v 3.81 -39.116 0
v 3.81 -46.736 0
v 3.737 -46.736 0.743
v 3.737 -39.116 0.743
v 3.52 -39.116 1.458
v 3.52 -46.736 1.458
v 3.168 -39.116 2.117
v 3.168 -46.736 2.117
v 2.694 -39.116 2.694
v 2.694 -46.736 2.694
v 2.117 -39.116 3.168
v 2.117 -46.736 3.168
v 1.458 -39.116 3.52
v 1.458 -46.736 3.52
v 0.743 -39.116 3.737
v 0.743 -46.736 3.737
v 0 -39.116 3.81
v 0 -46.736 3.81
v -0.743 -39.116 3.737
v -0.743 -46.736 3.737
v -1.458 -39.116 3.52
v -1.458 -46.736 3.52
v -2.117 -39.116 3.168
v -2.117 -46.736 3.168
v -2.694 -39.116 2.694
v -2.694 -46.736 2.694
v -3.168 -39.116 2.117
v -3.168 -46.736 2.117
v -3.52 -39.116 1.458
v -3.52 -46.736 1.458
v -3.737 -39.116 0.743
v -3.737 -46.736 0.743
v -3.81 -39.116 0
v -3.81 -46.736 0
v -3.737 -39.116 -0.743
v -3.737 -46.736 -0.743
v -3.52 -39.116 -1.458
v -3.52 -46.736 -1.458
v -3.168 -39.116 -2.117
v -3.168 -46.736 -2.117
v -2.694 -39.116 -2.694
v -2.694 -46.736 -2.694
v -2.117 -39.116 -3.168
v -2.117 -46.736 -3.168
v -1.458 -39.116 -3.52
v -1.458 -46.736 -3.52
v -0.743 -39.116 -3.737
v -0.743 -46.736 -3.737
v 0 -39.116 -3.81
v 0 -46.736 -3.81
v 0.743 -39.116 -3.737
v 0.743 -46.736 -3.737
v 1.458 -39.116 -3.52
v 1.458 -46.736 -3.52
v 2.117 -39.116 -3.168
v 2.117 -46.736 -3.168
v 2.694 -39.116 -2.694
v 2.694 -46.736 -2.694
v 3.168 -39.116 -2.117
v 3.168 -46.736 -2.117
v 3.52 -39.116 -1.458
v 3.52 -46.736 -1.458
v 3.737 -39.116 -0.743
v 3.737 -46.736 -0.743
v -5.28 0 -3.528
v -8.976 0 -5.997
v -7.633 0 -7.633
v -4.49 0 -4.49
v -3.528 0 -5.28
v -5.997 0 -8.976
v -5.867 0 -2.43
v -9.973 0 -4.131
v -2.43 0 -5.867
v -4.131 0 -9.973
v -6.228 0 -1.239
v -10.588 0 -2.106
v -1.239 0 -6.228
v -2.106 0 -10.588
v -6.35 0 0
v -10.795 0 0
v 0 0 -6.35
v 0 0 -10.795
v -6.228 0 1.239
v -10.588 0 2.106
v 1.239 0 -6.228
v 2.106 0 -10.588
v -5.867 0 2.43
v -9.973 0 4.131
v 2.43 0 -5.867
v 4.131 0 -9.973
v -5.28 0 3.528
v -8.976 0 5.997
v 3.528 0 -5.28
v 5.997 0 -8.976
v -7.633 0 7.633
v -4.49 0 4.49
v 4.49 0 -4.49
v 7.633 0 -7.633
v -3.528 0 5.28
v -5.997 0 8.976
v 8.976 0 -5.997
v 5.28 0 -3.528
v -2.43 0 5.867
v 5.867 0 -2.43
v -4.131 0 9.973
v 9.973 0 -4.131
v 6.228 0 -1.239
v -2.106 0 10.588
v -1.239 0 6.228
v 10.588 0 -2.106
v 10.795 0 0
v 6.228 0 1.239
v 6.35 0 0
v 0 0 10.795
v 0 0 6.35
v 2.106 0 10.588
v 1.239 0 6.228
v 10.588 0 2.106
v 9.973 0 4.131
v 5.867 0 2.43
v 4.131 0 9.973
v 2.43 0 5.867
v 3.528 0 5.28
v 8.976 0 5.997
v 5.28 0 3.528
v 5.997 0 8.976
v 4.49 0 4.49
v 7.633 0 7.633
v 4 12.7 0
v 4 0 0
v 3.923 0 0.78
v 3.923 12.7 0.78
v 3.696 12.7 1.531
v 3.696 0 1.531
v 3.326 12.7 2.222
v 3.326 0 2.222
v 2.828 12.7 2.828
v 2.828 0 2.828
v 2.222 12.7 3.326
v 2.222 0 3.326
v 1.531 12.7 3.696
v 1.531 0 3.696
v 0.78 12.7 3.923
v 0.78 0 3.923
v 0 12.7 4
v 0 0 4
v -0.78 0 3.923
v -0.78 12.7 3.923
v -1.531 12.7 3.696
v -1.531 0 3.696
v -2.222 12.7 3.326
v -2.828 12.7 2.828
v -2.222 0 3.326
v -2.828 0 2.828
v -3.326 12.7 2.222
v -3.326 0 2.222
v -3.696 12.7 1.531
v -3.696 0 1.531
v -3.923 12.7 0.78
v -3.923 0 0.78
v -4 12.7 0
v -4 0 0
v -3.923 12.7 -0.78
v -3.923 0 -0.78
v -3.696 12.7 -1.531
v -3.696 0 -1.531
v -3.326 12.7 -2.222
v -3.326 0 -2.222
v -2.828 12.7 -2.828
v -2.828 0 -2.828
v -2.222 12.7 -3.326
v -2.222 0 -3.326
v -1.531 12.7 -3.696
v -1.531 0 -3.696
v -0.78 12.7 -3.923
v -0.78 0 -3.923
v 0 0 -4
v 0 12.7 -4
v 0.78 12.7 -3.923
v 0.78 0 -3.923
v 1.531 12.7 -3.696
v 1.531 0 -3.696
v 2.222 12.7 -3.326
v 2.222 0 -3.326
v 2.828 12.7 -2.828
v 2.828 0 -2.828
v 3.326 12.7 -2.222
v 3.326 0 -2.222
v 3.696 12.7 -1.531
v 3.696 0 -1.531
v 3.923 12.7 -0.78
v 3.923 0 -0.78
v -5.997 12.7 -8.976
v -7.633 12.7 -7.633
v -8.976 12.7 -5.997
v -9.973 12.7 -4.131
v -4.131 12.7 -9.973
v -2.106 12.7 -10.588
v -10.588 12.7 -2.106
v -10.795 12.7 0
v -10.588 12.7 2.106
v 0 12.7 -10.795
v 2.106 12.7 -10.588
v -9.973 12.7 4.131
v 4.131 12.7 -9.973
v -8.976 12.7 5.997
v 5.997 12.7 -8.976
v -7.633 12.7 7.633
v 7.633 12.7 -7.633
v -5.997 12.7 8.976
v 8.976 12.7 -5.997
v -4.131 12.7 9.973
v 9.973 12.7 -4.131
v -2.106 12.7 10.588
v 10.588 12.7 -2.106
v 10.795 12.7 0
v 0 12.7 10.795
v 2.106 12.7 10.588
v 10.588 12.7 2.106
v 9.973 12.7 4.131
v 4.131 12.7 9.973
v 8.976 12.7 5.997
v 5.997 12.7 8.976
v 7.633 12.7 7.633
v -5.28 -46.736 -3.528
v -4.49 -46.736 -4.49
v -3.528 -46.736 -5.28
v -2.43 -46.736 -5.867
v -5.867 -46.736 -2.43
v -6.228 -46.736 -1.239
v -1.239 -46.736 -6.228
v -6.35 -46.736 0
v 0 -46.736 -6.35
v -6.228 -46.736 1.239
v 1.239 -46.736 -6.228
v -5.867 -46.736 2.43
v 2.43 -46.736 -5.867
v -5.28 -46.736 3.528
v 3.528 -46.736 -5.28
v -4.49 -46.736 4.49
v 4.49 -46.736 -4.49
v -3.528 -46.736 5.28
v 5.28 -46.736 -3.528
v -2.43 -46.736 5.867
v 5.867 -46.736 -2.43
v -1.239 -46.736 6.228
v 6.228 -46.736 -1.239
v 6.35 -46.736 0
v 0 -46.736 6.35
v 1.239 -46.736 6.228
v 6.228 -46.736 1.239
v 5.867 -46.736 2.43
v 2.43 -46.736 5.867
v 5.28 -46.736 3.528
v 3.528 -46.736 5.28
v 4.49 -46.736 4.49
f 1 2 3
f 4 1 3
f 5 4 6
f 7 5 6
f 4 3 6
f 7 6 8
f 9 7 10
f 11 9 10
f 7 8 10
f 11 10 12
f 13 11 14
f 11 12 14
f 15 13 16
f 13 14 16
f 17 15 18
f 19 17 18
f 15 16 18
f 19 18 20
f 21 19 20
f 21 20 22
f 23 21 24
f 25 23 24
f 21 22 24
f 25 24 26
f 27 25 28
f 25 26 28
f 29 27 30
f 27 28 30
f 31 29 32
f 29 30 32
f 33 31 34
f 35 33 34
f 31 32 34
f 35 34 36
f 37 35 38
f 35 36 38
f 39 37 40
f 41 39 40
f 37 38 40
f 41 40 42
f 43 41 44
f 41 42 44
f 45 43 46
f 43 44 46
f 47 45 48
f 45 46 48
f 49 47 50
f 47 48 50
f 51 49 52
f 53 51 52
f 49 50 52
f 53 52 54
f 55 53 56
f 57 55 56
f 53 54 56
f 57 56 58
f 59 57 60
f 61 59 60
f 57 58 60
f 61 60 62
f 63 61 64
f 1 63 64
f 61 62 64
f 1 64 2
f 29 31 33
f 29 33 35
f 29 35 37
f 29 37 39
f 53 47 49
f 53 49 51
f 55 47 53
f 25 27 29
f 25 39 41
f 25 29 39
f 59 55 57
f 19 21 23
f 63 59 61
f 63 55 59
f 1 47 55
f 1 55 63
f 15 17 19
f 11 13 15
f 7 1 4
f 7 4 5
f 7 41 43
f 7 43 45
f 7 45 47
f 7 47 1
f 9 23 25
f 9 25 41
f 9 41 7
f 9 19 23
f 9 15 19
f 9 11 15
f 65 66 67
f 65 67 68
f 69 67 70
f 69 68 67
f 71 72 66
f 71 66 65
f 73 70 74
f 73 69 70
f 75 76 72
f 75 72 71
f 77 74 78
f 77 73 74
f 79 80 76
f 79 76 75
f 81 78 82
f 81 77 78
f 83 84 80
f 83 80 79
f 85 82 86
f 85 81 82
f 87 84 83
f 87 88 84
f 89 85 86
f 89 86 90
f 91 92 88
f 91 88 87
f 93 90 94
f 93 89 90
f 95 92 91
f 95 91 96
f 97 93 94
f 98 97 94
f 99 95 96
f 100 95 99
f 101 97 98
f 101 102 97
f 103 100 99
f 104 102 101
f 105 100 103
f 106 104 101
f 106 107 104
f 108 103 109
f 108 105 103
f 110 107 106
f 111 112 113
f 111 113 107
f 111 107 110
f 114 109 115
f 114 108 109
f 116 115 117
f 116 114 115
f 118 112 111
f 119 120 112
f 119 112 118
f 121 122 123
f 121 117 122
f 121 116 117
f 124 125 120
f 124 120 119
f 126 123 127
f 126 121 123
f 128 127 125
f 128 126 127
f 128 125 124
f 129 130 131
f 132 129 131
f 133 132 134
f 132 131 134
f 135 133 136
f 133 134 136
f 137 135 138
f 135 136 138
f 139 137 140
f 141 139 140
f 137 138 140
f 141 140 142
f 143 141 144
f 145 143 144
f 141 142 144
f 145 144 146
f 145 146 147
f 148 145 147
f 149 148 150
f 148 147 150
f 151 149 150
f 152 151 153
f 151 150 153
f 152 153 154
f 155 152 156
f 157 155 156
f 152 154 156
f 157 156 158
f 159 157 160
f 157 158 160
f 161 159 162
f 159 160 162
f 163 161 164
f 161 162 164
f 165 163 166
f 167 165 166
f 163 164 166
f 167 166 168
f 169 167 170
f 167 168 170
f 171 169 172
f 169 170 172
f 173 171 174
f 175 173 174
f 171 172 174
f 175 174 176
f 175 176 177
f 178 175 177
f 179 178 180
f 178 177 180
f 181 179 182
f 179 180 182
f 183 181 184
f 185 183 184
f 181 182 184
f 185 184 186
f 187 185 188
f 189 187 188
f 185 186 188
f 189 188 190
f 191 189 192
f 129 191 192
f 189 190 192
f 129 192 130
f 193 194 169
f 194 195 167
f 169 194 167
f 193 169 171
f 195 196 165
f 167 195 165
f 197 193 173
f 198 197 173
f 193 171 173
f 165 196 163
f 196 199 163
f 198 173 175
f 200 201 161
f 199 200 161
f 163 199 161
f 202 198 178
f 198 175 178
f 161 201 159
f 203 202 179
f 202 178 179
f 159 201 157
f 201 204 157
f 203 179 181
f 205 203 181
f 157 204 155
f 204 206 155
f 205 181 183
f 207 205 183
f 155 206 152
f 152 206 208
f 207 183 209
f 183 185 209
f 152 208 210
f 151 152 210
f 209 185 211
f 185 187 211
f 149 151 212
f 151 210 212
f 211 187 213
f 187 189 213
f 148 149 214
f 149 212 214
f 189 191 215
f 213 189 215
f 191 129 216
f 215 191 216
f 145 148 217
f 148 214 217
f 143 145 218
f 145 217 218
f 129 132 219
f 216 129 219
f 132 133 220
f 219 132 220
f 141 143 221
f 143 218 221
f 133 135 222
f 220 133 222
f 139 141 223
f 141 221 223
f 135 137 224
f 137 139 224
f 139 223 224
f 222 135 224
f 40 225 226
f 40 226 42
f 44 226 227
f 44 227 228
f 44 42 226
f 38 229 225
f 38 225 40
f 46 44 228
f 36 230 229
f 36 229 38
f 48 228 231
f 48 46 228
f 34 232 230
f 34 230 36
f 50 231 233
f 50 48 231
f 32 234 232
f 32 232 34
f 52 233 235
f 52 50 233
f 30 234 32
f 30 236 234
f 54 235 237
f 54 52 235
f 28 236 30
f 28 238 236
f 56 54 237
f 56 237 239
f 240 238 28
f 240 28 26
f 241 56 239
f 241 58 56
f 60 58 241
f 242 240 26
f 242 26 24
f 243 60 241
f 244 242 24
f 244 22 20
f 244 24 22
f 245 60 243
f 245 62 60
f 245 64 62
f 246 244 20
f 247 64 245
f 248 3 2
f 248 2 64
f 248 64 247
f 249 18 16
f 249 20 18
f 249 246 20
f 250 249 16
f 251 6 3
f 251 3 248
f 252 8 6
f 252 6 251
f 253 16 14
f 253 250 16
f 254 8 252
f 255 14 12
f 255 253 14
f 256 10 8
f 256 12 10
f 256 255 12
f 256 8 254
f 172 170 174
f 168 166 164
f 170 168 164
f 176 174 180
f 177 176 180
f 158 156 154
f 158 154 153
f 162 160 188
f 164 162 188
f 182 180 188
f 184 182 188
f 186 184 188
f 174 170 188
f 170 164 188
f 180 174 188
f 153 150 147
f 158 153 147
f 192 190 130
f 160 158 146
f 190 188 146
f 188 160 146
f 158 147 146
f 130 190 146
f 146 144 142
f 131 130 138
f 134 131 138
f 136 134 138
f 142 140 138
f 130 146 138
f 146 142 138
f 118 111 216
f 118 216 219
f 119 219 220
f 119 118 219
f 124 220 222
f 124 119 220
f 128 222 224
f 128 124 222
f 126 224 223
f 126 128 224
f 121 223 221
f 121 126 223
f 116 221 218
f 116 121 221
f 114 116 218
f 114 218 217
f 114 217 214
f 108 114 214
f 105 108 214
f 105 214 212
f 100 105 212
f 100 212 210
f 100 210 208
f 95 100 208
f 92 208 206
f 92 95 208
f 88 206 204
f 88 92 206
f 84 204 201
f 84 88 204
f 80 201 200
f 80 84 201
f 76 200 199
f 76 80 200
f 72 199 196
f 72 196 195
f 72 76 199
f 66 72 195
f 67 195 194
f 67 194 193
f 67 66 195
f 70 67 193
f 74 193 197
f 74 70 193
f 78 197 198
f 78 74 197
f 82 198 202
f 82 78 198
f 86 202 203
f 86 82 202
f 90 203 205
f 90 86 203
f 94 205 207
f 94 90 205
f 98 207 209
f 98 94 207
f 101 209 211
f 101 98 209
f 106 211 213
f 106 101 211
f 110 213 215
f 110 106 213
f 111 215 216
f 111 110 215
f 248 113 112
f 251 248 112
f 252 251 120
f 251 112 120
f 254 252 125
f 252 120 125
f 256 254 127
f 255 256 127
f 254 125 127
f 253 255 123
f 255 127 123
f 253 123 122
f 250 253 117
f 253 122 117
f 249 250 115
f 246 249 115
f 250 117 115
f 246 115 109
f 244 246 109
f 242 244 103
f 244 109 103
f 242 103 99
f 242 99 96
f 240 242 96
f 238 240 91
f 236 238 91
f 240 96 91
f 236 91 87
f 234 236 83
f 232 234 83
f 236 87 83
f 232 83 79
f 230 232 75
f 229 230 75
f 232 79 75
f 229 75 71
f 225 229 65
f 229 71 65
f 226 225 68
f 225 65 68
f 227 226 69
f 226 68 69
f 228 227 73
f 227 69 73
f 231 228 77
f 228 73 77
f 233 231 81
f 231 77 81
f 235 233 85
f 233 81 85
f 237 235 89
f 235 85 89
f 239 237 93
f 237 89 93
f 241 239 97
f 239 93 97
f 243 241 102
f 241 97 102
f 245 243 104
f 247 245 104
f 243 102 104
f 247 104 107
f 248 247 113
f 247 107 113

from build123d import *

# Parameters (mm, degrees)
F0_R     = 6.35
F1_DEPTH = 46.736
F2_R     = 10.795
F2_R_2   = 4
F3_DEPTH = 12.7
F4_R     = 3.81
F5_DEPTH = 7.62


with BuildPart() as f1:
    # F0 (on Front) → F1 (new body)
    with BuildSketch(Plane.XZ):
        Circle(F0_R)
    extrude(amount=F1_DEPTH)

    # F2 (on Front) → F3 (join)
    with BuildSketch(Plane.XZ):
        Circle(F2_R)
        Circle(F2_R_2, mode=Mode.SUBTRACT)
    extrude(amount=-F3_DEPTH)

    # F4 (on face) → F5 (cut)
    with BuildSketch(Plane.XZ.offset(46.736)):
        Circle(F4_R)
    extrude(amount=-F5_DEPTH, mode=Mode.SUBTRACT)


solid = f1.part
